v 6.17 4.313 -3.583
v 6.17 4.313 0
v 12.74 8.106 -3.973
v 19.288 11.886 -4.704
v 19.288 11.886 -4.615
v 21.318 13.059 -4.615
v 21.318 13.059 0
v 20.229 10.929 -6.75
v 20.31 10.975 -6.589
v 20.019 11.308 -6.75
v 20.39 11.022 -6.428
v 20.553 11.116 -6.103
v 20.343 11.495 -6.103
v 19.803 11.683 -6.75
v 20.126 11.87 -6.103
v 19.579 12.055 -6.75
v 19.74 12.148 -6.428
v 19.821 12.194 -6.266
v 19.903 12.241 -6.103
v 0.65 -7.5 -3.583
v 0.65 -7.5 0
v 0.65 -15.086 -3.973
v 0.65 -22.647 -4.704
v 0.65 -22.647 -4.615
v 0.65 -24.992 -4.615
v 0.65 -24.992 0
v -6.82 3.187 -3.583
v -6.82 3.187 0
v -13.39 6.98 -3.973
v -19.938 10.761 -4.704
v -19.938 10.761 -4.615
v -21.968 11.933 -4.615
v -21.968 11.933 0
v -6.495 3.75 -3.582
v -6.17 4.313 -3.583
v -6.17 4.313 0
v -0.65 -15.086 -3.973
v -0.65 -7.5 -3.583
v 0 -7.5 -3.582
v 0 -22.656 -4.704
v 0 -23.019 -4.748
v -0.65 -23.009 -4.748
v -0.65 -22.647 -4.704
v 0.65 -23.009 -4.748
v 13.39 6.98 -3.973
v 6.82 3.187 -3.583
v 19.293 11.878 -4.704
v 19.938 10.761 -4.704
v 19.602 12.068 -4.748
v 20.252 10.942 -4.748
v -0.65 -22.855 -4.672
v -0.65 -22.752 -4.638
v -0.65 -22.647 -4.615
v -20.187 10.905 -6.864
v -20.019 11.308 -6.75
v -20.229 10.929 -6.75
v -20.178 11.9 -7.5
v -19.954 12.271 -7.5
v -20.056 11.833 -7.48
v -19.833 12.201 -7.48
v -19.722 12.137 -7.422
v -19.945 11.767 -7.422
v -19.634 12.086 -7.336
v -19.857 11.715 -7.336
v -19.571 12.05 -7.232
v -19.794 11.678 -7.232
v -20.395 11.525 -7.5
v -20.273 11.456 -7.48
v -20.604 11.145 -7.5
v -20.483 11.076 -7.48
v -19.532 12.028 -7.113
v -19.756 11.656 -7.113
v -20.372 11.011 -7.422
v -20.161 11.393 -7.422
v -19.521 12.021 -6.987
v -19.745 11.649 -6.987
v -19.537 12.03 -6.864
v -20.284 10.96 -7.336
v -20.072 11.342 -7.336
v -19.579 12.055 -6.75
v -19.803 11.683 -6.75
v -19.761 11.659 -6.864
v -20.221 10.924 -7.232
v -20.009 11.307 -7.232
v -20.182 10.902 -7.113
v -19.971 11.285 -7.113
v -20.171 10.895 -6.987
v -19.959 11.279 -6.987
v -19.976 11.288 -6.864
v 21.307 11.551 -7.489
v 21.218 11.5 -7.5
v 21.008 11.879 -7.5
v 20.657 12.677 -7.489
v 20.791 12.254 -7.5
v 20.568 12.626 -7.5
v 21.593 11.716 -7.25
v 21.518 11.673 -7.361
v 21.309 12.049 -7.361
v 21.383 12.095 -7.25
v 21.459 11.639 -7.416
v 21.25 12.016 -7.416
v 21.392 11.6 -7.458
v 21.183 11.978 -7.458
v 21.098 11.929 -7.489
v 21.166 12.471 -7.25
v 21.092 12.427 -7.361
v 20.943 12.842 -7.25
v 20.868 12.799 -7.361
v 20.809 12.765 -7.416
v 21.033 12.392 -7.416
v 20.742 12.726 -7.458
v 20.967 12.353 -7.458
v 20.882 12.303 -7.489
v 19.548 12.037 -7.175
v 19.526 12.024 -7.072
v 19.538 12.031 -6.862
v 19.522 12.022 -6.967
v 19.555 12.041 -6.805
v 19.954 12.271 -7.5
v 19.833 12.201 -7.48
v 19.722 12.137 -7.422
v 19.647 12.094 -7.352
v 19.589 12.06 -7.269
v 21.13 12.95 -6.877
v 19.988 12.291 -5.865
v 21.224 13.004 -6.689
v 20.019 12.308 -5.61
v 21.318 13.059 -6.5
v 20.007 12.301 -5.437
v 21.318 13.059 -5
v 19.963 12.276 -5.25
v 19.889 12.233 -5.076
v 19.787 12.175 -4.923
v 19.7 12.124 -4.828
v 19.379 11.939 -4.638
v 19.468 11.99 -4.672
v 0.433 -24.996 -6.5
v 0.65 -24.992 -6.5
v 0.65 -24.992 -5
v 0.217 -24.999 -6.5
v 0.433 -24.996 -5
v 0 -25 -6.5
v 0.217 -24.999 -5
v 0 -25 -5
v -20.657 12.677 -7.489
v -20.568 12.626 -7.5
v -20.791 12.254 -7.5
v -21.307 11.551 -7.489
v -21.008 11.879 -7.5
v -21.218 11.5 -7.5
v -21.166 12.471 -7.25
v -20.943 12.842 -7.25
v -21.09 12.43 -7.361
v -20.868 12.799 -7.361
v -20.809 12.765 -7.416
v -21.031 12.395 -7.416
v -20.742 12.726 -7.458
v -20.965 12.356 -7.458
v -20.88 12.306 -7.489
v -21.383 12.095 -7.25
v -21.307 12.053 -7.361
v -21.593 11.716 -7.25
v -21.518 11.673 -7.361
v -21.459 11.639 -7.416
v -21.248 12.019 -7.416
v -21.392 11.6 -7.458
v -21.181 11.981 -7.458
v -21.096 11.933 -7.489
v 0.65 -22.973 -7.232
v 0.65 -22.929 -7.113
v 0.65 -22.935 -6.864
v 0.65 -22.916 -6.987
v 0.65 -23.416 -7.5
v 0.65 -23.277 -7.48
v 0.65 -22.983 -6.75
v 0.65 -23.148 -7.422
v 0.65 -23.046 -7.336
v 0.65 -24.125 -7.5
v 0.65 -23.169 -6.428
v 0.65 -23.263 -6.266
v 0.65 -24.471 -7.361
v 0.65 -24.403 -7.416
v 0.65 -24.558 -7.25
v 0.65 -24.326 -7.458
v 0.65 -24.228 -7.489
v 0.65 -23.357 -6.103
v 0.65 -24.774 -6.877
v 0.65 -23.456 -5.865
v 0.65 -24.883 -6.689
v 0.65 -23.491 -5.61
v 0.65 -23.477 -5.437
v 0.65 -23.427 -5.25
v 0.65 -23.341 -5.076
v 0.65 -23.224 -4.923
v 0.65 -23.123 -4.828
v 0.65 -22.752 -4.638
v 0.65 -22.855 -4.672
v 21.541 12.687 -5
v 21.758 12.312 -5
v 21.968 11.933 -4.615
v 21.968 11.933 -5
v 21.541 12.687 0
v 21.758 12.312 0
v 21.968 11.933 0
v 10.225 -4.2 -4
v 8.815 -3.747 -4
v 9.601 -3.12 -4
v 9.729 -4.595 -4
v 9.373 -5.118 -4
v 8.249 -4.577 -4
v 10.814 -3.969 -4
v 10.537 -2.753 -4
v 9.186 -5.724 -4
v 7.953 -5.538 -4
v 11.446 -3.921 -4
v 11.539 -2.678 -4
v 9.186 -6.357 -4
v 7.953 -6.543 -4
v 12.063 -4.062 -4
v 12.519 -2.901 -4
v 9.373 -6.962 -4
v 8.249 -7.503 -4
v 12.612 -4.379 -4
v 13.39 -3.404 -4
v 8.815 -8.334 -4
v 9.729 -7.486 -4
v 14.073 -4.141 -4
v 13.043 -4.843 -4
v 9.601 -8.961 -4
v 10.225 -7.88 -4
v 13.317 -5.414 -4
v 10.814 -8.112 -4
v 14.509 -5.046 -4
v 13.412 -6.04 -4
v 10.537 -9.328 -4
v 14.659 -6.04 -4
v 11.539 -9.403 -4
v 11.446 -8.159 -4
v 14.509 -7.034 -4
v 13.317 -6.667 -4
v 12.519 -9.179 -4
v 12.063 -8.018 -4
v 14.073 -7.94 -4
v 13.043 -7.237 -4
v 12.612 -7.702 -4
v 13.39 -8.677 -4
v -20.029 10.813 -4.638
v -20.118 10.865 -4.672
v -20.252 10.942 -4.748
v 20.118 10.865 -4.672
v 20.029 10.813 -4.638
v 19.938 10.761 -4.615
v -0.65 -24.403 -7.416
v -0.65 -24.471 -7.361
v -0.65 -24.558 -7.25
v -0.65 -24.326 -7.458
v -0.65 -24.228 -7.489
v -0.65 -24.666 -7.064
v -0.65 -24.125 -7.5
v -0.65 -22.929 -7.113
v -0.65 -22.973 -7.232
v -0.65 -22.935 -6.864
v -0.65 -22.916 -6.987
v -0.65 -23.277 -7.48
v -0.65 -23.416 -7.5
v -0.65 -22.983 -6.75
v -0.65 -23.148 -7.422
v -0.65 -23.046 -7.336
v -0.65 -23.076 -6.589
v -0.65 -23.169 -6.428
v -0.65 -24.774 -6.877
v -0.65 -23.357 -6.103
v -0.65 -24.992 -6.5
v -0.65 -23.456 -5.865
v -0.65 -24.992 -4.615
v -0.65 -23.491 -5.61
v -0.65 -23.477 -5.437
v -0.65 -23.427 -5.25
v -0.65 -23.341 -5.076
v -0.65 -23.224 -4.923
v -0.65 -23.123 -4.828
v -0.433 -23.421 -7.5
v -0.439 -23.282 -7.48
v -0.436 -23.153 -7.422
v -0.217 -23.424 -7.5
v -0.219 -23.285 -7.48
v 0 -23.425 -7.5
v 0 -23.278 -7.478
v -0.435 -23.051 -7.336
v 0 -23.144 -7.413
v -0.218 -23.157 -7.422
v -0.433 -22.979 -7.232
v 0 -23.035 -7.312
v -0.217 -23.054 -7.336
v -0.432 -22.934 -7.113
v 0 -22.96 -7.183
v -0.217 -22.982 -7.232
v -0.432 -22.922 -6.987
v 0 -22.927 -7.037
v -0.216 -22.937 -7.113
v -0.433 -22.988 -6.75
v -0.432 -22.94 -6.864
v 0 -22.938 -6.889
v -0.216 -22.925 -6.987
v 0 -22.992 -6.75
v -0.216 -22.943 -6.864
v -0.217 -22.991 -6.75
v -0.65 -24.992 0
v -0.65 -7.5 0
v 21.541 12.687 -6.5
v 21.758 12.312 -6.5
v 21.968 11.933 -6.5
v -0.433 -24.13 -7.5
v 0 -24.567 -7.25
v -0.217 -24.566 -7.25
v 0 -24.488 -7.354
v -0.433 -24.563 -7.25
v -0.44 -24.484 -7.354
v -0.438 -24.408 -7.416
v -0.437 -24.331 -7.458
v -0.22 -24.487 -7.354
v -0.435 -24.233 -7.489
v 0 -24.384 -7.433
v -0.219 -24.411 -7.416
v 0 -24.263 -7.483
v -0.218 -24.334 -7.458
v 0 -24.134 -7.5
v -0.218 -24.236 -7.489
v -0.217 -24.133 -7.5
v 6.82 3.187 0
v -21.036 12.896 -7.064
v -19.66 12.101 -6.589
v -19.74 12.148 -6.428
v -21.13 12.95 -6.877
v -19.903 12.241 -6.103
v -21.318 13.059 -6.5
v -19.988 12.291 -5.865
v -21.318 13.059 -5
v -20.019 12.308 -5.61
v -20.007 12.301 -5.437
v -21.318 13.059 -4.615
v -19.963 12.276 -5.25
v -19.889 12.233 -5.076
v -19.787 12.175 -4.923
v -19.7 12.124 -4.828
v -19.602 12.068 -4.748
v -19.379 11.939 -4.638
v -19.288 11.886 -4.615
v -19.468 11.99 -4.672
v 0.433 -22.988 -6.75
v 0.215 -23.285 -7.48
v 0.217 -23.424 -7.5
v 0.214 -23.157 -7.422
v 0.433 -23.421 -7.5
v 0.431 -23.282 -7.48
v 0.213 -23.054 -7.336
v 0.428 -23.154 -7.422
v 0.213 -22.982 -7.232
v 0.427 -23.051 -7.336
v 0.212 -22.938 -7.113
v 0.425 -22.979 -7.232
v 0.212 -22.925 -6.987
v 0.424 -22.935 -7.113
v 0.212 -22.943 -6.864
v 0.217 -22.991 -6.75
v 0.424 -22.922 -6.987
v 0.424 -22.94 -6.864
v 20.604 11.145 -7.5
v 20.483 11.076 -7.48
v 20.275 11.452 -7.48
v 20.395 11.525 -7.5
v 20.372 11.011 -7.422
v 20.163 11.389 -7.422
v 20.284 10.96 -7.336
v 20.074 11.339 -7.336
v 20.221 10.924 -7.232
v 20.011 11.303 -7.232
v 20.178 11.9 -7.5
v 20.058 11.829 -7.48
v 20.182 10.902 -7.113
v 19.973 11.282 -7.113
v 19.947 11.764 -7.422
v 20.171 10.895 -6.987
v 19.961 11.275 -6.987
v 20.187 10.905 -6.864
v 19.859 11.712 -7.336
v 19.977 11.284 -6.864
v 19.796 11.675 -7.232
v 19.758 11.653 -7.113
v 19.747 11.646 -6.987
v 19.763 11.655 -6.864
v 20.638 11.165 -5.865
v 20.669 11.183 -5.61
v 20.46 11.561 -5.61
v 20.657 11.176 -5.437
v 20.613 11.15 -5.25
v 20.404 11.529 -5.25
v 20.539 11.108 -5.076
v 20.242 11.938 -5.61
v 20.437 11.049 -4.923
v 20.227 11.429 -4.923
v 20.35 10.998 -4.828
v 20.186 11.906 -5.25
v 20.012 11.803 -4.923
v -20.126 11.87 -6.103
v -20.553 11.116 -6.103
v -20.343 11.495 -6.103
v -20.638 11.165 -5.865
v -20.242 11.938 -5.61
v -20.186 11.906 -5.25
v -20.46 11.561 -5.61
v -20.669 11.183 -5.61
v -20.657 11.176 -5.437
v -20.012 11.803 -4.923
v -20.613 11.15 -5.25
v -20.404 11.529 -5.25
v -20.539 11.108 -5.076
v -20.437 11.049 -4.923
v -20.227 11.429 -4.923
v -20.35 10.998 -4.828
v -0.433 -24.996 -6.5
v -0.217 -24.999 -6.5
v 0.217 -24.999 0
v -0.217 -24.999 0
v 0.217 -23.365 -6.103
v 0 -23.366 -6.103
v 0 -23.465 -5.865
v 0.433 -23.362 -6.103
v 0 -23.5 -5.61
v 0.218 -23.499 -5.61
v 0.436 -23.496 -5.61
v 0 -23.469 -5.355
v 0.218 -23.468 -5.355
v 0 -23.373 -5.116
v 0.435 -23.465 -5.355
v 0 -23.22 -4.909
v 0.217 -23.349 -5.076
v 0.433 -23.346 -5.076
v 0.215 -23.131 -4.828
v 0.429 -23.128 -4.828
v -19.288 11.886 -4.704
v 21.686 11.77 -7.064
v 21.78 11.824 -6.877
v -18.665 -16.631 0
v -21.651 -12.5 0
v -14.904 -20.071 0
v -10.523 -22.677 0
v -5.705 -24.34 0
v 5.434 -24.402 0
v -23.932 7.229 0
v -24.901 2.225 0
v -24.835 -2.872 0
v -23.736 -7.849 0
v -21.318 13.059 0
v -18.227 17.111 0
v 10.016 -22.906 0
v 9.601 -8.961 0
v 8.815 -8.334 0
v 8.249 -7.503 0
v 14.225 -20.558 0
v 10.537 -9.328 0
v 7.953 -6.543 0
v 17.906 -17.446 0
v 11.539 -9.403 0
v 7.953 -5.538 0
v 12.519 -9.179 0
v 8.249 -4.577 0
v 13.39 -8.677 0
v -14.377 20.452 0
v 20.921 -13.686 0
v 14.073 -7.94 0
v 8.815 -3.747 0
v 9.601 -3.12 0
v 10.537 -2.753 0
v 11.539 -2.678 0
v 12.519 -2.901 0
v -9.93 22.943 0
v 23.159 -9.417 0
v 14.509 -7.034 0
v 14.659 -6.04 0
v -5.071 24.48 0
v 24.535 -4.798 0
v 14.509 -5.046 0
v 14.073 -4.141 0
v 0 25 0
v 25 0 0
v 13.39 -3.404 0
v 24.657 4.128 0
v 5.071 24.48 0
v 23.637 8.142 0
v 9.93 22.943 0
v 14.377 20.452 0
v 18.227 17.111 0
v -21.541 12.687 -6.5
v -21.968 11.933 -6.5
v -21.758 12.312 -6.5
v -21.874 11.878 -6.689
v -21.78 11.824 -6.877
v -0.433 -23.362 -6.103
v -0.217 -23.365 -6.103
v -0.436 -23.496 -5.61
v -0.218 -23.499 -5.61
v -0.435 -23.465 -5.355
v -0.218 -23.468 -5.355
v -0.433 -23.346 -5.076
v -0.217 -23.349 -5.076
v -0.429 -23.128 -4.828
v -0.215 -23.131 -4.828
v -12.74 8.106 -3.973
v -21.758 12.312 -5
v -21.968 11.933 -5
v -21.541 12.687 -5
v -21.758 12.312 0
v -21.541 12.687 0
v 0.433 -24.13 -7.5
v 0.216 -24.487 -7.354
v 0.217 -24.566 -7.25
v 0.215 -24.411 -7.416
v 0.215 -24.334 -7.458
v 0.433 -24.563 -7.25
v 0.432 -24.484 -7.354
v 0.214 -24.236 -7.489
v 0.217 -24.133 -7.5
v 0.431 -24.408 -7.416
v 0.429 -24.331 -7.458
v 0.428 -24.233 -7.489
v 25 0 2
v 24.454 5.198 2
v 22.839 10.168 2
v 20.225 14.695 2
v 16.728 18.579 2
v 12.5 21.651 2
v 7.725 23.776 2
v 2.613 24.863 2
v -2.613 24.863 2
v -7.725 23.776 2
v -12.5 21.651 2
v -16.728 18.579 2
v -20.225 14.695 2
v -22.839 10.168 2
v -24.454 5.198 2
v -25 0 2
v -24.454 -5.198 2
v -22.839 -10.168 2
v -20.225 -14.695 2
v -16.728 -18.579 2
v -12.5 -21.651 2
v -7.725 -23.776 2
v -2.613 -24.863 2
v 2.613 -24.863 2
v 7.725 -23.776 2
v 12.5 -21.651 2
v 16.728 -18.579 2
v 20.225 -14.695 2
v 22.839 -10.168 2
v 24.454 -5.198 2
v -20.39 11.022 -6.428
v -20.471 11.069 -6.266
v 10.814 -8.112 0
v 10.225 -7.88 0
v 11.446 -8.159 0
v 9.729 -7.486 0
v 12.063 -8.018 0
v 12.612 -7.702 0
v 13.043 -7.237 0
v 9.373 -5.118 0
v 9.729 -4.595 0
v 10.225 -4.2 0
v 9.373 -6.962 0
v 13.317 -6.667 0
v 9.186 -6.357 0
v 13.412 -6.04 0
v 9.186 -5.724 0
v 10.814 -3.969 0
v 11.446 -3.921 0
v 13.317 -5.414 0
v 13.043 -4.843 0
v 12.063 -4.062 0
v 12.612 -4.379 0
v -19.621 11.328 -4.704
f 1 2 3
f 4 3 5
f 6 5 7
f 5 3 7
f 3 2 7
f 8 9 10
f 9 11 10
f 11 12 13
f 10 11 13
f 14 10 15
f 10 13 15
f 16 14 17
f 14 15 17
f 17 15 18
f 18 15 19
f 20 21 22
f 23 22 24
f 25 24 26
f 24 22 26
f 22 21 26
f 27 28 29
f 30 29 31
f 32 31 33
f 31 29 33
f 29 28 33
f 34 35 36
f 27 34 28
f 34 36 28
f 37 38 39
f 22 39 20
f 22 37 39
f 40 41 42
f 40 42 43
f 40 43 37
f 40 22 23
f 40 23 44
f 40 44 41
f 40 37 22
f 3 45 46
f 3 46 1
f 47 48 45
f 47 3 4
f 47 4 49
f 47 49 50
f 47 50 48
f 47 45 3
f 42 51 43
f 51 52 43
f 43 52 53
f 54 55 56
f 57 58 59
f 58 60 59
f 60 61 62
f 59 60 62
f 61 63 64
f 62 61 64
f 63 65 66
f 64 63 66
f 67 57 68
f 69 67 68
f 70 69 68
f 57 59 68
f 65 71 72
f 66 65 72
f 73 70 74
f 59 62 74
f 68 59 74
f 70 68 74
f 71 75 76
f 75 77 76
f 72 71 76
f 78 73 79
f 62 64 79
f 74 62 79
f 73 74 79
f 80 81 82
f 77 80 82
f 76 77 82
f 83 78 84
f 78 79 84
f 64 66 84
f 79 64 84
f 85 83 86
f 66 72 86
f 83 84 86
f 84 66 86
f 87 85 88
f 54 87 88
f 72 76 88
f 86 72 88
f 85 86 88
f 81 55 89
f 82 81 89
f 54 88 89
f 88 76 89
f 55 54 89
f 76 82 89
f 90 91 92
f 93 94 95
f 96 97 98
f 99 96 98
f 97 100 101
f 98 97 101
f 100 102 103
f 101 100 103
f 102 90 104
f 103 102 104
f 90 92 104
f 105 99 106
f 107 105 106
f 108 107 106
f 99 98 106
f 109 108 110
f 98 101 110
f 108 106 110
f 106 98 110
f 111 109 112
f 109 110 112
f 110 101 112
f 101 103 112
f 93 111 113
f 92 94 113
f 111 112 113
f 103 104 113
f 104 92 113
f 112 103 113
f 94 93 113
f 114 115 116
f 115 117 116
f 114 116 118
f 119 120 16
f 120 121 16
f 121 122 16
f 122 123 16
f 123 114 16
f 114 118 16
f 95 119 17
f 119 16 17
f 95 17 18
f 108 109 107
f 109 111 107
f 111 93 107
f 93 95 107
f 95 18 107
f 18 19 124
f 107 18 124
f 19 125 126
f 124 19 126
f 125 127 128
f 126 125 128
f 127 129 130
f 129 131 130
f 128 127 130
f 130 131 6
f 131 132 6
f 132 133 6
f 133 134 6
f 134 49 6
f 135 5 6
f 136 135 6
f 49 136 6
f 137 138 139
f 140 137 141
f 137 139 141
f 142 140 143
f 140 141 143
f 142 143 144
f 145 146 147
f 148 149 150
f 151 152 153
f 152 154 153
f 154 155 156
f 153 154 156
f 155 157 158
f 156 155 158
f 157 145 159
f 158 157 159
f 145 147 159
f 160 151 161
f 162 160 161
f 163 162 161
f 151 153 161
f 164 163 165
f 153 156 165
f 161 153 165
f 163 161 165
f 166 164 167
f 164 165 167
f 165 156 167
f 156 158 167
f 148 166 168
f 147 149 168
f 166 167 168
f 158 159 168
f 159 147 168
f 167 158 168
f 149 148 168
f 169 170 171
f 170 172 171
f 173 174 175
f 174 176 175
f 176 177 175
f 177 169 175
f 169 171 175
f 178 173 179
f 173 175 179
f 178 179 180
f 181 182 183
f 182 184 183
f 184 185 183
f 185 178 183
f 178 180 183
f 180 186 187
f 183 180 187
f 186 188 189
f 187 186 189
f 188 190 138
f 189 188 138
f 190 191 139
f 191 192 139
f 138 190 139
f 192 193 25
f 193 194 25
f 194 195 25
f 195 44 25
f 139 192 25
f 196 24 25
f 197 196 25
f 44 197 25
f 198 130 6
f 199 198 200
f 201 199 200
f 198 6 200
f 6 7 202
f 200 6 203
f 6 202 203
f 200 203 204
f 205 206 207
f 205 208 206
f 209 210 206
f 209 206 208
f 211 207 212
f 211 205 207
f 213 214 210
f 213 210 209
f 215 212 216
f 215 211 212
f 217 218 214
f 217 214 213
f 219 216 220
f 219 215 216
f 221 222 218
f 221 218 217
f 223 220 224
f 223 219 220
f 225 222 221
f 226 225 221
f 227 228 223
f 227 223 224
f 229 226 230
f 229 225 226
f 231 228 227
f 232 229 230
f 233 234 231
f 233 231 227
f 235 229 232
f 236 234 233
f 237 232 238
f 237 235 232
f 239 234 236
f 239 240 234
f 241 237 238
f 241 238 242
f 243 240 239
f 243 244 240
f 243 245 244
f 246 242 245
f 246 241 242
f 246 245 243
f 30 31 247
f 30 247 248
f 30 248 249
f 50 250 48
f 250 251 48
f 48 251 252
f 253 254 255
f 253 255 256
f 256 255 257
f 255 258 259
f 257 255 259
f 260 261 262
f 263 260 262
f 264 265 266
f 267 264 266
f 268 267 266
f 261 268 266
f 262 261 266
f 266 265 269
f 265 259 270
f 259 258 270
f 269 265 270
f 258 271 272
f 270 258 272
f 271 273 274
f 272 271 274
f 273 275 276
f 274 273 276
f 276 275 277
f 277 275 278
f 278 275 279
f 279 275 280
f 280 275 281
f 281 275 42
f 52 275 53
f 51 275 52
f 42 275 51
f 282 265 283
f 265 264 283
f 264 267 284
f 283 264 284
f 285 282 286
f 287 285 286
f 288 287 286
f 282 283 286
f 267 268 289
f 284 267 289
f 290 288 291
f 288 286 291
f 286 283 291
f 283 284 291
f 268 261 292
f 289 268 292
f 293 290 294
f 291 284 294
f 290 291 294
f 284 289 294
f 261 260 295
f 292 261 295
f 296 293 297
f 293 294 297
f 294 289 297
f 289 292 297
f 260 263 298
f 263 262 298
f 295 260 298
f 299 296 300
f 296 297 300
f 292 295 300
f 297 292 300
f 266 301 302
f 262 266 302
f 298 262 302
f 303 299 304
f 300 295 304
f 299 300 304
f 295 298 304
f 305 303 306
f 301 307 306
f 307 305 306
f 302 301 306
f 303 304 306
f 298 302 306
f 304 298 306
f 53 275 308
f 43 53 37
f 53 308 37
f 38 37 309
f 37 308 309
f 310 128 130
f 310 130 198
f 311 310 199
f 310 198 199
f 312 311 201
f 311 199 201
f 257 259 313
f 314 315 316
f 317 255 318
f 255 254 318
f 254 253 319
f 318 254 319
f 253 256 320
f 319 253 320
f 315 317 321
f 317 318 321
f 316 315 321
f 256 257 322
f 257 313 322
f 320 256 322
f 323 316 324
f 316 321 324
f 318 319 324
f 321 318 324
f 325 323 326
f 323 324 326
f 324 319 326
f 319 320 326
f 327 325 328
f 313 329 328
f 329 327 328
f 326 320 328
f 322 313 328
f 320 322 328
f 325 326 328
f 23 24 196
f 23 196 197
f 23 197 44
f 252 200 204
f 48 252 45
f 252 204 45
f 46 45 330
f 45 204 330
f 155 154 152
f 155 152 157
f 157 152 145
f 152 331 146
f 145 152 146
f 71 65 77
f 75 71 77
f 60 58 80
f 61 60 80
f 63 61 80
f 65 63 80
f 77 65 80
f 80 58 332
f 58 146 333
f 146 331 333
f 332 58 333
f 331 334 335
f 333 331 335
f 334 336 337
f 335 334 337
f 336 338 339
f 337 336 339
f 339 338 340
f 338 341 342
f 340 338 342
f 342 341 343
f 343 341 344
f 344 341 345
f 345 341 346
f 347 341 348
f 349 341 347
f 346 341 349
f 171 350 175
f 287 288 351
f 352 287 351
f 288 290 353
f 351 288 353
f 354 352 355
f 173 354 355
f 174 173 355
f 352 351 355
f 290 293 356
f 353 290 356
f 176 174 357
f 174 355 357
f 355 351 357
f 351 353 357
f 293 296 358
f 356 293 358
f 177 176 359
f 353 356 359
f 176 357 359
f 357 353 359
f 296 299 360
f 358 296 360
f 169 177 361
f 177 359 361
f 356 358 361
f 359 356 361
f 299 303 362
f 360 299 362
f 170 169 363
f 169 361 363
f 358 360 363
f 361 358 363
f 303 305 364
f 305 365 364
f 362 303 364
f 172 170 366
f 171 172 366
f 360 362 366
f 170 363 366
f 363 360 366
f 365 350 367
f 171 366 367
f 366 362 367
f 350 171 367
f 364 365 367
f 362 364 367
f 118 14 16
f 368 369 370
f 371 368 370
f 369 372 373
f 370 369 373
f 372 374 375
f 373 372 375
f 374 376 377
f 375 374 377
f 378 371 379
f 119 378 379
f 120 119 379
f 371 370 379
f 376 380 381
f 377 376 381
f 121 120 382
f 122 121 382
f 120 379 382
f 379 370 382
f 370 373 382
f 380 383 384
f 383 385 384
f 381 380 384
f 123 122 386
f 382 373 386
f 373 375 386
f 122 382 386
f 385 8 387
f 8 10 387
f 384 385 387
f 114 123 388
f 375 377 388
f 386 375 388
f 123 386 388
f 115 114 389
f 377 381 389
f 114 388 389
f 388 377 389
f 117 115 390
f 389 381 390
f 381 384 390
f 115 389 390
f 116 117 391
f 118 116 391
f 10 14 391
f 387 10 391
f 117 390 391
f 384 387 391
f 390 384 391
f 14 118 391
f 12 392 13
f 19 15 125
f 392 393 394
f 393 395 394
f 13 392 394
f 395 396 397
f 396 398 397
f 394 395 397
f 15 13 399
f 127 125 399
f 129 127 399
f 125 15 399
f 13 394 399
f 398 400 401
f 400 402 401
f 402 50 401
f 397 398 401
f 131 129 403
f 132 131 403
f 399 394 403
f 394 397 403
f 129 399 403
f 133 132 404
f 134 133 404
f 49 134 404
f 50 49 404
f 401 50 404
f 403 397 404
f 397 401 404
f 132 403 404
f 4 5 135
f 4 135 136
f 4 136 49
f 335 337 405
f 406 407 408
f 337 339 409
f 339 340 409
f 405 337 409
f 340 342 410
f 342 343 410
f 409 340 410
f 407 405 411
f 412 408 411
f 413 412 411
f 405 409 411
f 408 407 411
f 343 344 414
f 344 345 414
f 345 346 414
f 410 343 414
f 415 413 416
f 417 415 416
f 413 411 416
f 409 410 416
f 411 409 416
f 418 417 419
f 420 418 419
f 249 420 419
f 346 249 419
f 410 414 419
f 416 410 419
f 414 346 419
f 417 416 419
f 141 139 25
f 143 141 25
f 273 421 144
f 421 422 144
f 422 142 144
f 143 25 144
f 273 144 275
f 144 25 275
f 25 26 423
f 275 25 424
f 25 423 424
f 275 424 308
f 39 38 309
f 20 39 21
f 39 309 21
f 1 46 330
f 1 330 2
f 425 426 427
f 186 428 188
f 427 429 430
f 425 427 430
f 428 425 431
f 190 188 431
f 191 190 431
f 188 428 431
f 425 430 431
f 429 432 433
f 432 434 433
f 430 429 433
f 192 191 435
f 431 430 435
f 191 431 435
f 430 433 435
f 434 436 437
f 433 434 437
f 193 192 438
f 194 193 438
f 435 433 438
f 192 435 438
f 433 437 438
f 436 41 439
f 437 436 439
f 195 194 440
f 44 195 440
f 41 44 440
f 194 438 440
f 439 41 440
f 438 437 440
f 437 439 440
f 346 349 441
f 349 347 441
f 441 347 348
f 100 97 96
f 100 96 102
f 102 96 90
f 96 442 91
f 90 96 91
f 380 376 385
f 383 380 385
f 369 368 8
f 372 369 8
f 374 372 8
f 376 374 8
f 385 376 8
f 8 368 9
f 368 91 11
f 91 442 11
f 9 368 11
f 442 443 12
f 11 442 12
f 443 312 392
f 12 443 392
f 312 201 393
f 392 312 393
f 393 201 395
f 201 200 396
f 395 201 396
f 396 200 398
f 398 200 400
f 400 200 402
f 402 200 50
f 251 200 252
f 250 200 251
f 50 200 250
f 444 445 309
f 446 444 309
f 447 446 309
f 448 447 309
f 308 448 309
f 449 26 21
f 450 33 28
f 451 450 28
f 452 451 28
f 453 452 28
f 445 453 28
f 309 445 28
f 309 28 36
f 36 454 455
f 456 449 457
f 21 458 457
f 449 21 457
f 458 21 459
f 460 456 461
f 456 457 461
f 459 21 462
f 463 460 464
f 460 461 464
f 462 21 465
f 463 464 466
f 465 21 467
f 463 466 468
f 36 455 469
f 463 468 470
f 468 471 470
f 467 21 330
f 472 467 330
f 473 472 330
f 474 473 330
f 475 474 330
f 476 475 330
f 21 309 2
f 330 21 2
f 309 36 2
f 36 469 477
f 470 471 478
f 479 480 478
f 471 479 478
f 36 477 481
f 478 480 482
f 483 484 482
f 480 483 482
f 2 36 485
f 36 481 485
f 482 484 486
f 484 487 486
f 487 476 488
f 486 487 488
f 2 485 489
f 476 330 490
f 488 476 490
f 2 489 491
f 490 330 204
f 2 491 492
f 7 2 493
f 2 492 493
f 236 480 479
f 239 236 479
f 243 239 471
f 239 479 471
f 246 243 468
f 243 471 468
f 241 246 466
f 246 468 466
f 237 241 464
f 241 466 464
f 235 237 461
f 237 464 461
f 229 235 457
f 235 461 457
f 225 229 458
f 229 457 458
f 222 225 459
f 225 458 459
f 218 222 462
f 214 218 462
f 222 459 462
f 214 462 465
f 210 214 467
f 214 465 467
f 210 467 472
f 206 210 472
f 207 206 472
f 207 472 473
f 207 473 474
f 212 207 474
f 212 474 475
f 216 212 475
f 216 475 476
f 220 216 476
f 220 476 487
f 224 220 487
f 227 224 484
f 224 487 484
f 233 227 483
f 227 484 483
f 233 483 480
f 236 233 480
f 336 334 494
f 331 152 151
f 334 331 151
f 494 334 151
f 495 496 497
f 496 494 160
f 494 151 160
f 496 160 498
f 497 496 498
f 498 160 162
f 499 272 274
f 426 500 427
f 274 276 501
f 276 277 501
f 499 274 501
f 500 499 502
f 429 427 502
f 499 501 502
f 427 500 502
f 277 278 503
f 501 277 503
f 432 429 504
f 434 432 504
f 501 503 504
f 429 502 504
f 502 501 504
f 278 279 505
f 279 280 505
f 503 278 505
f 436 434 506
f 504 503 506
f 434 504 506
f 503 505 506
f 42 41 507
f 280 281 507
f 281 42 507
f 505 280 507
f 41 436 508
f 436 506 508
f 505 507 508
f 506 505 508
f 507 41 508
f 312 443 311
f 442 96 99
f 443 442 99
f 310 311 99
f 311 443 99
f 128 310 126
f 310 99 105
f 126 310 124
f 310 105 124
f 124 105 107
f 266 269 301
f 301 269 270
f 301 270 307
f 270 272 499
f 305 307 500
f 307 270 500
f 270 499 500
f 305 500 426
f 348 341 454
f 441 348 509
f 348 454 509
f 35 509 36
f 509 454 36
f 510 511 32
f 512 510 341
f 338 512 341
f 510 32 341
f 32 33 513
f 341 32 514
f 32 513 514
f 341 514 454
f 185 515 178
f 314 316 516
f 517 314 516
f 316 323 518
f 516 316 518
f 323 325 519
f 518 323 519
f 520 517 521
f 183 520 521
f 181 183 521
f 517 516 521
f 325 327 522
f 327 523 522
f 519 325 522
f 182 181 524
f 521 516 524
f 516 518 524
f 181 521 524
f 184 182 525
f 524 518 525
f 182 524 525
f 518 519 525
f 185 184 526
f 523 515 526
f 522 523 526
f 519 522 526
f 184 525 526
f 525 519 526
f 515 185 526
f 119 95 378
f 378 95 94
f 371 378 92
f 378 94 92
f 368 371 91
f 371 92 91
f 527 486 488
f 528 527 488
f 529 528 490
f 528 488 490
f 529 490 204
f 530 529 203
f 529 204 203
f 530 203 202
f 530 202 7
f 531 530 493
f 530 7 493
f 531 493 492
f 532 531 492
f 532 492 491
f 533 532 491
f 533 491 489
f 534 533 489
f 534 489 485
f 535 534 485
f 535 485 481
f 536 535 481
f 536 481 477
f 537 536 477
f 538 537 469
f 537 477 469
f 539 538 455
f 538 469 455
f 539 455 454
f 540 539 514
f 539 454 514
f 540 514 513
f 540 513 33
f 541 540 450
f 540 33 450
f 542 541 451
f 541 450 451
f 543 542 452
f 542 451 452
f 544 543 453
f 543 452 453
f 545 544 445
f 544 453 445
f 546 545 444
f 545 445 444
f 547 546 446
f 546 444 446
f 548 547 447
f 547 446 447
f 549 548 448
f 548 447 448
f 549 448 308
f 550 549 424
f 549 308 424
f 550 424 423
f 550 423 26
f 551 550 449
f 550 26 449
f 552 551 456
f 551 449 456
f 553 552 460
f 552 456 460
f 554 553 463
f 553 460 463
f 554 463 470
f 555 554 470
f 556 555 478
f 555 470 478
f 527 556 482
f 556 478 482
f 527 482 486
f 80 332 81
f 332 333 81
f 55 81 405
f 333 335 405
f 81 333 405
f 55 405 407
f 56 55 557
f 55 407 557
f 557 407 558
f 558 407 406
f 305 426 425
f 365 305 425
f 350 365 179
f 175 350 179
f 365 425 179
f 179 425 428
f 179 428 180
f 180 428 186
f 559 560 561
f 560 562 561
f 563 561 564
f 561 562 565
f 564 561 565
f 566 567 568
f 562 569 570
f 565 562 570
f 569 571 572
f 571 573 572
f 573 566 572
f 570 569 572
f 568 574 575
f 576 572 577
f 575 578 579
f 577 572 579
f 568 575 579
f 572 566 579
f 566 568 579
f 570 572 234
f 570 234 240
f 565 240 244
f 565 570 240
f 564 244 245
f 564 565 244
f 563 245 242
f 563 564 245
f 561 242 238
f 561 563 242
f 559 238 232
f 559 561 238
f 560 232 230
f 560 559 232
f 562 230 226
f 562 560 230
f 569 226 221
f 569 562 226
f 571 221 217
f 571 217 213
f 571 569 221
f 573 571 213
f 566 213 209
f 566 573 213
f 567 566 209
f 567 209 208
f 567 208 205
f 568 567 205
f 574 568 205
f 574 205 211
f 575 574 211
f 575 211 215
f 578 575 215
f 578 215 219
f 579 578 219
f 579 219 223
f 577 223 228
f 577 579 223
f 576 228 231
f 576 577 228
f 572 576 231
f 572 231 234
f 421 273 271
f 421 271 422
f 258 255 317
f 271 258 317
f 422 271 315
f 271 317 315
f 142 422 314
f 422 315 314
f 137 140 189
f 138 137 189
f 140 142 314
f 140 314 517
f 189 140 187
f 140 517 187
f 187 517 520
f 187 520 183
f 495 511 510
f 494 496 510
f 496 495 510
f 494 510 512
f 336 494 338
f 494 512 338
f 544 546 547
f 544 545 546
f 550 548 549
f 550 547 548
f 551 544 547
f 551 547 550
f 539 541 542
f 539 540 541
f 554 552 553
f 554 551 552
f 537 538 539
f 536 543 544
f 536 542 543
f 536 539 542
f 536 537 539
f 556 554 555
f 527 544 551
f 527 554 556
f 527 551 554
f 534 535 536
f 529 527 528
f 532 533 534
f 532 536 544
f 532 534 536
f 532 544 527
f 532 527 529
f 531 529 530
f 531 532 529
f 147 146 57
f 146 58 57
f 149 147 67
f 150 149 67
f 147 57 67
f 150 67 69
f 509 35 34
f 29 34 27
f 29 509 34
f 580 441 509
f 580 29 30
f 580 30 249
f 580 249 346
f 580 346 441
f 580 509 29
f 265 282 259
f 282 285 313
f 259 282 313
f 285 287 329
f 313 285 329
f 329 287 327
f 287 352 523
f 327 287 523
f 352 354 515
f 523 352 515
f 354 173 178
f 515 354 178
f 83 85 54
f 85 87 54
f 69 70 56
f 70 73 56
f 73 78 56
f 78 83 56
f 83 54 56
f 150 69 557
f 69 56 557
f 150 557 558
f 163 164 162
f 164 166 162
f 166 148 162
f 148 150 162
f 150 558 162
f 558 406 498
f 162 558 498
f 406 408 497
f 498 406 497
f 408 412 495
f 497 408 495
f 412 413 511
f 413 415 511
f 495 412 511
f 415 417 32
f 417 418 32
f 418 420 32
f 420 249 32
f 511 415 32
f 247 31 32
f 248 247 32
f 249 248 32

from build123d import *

# Parameters (mm, degrees)
F0_R      = 25
F1_DEPTH  = 2
F3_DEPTH  = 5
F4_COUNT  = 3
F9_DEPTH  = 25
F10_R     = 3.3721537094
F10_R_2   = 2.124818642
F11_DEPTH = 4


with BuildPart() as f1:
    # F0 (on Top) → F1 (new body)
    with BuildSketch(Plane.XY):
        Circle(F0_R)
    extrude(amount=F1_DEPTH)

    # F2 (on face) → F3 (join)
    with BuildSketch(Plane(origin=(0, 0, 0), x_dir=(1, 0, 0), z_dir=(0, 0, -1))):
        with BuildLine():
            ThreePointArc((0.65, 24.9915485715), (0, 25), (-0.65, 24.9915485715))
            Line((-0.65, 24.9915485715), (-0.65, 7.5))
            Line((-0.65, 7.5), (0.65, 7.5))
            Line((0.65, 7.5), (0.65, 24.9915485715))
        make_face()
    extrude(amount=F3_DEPTH)

    # F4: F1 ×3 about axis
    f4_axis = Axis((0, 0, 0), (0, 0, -1))


with BuildPart() as f1_1:
    add(f1.part)
    for i in range(1, F4_COUNT):
        add(f1.part.rotate(f4_axis, i * 360 / F4_COUNT))

    # F5 (on Right) → F6 (revolve, cut)
    with BuildSketch(Plane.YZ):
        with BuildLine():
            Line((-24.9915485715, -5), (-7.5, -5))
            Line((-7.5, -5), (-7.5, -3.5817198365))
            ThreePointArc((-7.5, -3.5817198365), (-16.2642373071, -4.0631567864), (-24.9915485715, -5))
        make_face()
    revolve(axis=Axis((0, 0, 6.1360122636), (0, 0, 1)), mode=Mode.SUBTRACT)

    # F7 (on Right) → F8 (revolve)
    with BuildSketch(Plane.YZ):
        with BuildLine():
            Line((-22.6562518635, -4.6152084697), (-25, -4.6152084697))
            Line((-25, -4.6152084697), (-25, -6.5))
            Line((-25, -6.5), (-24.5669872981, -7.25))
            ThreePointArc((-24.5669872981, -7.25), (-24.3839745962, -7.4330127019), (-24.1339745962, -7.5))
            Line((-24.1339745962, -7.5), (-23.4254495926, -7.5))
            ThreePointArc((-23.4254495926, -7.5), (-22.9924368907, -7.25), (-22.9924368907, -6.75))
            Line((-22.9924368907, -6.75), (-23.3660254038, -6.1029257142))
            ThreePointArc((-23.3660254038, -6.1029257142), (-23.4025454851, -5.1723311865), (-22.6562518635, -4.6152084697))
        make_face()
    revolve(axis=Axis((0, 0, 4.5727211982), (0, 0, 1)))

    # F9 (cut): faces of the model
    f9_faces = [f1_1.faces().sort_by_distance(p)[0] for p in [
        (-20.0039367559, -11.5492782709, -4.6152084697),
        (20.0800258631, 12.8588493661, -4.6152084697),
        (1.0923046782, -23.8192371892, -4.6152084697),
    ]]
    extrude(f9_faces, amount=-F9_DEPTH, mode=Mode.SUBTRACT)

    # F10 (on face) → F11 (join)
    with BuildSketch(Plane(origin=(0, 0, 0), x_dir=(1, 0, 0), z_dir=(0, 0, -1))):
        with Locations((11.2870344892, 6.0402974486)):
            Circle(F10_R)
        with Locations((11.2870344892, 6.0402974486)):
            Circle(F10_R_2, mode=Mode.SUBTRACT)
    extrude(amount=F11_DEPTH)


solid = f1_1.part
